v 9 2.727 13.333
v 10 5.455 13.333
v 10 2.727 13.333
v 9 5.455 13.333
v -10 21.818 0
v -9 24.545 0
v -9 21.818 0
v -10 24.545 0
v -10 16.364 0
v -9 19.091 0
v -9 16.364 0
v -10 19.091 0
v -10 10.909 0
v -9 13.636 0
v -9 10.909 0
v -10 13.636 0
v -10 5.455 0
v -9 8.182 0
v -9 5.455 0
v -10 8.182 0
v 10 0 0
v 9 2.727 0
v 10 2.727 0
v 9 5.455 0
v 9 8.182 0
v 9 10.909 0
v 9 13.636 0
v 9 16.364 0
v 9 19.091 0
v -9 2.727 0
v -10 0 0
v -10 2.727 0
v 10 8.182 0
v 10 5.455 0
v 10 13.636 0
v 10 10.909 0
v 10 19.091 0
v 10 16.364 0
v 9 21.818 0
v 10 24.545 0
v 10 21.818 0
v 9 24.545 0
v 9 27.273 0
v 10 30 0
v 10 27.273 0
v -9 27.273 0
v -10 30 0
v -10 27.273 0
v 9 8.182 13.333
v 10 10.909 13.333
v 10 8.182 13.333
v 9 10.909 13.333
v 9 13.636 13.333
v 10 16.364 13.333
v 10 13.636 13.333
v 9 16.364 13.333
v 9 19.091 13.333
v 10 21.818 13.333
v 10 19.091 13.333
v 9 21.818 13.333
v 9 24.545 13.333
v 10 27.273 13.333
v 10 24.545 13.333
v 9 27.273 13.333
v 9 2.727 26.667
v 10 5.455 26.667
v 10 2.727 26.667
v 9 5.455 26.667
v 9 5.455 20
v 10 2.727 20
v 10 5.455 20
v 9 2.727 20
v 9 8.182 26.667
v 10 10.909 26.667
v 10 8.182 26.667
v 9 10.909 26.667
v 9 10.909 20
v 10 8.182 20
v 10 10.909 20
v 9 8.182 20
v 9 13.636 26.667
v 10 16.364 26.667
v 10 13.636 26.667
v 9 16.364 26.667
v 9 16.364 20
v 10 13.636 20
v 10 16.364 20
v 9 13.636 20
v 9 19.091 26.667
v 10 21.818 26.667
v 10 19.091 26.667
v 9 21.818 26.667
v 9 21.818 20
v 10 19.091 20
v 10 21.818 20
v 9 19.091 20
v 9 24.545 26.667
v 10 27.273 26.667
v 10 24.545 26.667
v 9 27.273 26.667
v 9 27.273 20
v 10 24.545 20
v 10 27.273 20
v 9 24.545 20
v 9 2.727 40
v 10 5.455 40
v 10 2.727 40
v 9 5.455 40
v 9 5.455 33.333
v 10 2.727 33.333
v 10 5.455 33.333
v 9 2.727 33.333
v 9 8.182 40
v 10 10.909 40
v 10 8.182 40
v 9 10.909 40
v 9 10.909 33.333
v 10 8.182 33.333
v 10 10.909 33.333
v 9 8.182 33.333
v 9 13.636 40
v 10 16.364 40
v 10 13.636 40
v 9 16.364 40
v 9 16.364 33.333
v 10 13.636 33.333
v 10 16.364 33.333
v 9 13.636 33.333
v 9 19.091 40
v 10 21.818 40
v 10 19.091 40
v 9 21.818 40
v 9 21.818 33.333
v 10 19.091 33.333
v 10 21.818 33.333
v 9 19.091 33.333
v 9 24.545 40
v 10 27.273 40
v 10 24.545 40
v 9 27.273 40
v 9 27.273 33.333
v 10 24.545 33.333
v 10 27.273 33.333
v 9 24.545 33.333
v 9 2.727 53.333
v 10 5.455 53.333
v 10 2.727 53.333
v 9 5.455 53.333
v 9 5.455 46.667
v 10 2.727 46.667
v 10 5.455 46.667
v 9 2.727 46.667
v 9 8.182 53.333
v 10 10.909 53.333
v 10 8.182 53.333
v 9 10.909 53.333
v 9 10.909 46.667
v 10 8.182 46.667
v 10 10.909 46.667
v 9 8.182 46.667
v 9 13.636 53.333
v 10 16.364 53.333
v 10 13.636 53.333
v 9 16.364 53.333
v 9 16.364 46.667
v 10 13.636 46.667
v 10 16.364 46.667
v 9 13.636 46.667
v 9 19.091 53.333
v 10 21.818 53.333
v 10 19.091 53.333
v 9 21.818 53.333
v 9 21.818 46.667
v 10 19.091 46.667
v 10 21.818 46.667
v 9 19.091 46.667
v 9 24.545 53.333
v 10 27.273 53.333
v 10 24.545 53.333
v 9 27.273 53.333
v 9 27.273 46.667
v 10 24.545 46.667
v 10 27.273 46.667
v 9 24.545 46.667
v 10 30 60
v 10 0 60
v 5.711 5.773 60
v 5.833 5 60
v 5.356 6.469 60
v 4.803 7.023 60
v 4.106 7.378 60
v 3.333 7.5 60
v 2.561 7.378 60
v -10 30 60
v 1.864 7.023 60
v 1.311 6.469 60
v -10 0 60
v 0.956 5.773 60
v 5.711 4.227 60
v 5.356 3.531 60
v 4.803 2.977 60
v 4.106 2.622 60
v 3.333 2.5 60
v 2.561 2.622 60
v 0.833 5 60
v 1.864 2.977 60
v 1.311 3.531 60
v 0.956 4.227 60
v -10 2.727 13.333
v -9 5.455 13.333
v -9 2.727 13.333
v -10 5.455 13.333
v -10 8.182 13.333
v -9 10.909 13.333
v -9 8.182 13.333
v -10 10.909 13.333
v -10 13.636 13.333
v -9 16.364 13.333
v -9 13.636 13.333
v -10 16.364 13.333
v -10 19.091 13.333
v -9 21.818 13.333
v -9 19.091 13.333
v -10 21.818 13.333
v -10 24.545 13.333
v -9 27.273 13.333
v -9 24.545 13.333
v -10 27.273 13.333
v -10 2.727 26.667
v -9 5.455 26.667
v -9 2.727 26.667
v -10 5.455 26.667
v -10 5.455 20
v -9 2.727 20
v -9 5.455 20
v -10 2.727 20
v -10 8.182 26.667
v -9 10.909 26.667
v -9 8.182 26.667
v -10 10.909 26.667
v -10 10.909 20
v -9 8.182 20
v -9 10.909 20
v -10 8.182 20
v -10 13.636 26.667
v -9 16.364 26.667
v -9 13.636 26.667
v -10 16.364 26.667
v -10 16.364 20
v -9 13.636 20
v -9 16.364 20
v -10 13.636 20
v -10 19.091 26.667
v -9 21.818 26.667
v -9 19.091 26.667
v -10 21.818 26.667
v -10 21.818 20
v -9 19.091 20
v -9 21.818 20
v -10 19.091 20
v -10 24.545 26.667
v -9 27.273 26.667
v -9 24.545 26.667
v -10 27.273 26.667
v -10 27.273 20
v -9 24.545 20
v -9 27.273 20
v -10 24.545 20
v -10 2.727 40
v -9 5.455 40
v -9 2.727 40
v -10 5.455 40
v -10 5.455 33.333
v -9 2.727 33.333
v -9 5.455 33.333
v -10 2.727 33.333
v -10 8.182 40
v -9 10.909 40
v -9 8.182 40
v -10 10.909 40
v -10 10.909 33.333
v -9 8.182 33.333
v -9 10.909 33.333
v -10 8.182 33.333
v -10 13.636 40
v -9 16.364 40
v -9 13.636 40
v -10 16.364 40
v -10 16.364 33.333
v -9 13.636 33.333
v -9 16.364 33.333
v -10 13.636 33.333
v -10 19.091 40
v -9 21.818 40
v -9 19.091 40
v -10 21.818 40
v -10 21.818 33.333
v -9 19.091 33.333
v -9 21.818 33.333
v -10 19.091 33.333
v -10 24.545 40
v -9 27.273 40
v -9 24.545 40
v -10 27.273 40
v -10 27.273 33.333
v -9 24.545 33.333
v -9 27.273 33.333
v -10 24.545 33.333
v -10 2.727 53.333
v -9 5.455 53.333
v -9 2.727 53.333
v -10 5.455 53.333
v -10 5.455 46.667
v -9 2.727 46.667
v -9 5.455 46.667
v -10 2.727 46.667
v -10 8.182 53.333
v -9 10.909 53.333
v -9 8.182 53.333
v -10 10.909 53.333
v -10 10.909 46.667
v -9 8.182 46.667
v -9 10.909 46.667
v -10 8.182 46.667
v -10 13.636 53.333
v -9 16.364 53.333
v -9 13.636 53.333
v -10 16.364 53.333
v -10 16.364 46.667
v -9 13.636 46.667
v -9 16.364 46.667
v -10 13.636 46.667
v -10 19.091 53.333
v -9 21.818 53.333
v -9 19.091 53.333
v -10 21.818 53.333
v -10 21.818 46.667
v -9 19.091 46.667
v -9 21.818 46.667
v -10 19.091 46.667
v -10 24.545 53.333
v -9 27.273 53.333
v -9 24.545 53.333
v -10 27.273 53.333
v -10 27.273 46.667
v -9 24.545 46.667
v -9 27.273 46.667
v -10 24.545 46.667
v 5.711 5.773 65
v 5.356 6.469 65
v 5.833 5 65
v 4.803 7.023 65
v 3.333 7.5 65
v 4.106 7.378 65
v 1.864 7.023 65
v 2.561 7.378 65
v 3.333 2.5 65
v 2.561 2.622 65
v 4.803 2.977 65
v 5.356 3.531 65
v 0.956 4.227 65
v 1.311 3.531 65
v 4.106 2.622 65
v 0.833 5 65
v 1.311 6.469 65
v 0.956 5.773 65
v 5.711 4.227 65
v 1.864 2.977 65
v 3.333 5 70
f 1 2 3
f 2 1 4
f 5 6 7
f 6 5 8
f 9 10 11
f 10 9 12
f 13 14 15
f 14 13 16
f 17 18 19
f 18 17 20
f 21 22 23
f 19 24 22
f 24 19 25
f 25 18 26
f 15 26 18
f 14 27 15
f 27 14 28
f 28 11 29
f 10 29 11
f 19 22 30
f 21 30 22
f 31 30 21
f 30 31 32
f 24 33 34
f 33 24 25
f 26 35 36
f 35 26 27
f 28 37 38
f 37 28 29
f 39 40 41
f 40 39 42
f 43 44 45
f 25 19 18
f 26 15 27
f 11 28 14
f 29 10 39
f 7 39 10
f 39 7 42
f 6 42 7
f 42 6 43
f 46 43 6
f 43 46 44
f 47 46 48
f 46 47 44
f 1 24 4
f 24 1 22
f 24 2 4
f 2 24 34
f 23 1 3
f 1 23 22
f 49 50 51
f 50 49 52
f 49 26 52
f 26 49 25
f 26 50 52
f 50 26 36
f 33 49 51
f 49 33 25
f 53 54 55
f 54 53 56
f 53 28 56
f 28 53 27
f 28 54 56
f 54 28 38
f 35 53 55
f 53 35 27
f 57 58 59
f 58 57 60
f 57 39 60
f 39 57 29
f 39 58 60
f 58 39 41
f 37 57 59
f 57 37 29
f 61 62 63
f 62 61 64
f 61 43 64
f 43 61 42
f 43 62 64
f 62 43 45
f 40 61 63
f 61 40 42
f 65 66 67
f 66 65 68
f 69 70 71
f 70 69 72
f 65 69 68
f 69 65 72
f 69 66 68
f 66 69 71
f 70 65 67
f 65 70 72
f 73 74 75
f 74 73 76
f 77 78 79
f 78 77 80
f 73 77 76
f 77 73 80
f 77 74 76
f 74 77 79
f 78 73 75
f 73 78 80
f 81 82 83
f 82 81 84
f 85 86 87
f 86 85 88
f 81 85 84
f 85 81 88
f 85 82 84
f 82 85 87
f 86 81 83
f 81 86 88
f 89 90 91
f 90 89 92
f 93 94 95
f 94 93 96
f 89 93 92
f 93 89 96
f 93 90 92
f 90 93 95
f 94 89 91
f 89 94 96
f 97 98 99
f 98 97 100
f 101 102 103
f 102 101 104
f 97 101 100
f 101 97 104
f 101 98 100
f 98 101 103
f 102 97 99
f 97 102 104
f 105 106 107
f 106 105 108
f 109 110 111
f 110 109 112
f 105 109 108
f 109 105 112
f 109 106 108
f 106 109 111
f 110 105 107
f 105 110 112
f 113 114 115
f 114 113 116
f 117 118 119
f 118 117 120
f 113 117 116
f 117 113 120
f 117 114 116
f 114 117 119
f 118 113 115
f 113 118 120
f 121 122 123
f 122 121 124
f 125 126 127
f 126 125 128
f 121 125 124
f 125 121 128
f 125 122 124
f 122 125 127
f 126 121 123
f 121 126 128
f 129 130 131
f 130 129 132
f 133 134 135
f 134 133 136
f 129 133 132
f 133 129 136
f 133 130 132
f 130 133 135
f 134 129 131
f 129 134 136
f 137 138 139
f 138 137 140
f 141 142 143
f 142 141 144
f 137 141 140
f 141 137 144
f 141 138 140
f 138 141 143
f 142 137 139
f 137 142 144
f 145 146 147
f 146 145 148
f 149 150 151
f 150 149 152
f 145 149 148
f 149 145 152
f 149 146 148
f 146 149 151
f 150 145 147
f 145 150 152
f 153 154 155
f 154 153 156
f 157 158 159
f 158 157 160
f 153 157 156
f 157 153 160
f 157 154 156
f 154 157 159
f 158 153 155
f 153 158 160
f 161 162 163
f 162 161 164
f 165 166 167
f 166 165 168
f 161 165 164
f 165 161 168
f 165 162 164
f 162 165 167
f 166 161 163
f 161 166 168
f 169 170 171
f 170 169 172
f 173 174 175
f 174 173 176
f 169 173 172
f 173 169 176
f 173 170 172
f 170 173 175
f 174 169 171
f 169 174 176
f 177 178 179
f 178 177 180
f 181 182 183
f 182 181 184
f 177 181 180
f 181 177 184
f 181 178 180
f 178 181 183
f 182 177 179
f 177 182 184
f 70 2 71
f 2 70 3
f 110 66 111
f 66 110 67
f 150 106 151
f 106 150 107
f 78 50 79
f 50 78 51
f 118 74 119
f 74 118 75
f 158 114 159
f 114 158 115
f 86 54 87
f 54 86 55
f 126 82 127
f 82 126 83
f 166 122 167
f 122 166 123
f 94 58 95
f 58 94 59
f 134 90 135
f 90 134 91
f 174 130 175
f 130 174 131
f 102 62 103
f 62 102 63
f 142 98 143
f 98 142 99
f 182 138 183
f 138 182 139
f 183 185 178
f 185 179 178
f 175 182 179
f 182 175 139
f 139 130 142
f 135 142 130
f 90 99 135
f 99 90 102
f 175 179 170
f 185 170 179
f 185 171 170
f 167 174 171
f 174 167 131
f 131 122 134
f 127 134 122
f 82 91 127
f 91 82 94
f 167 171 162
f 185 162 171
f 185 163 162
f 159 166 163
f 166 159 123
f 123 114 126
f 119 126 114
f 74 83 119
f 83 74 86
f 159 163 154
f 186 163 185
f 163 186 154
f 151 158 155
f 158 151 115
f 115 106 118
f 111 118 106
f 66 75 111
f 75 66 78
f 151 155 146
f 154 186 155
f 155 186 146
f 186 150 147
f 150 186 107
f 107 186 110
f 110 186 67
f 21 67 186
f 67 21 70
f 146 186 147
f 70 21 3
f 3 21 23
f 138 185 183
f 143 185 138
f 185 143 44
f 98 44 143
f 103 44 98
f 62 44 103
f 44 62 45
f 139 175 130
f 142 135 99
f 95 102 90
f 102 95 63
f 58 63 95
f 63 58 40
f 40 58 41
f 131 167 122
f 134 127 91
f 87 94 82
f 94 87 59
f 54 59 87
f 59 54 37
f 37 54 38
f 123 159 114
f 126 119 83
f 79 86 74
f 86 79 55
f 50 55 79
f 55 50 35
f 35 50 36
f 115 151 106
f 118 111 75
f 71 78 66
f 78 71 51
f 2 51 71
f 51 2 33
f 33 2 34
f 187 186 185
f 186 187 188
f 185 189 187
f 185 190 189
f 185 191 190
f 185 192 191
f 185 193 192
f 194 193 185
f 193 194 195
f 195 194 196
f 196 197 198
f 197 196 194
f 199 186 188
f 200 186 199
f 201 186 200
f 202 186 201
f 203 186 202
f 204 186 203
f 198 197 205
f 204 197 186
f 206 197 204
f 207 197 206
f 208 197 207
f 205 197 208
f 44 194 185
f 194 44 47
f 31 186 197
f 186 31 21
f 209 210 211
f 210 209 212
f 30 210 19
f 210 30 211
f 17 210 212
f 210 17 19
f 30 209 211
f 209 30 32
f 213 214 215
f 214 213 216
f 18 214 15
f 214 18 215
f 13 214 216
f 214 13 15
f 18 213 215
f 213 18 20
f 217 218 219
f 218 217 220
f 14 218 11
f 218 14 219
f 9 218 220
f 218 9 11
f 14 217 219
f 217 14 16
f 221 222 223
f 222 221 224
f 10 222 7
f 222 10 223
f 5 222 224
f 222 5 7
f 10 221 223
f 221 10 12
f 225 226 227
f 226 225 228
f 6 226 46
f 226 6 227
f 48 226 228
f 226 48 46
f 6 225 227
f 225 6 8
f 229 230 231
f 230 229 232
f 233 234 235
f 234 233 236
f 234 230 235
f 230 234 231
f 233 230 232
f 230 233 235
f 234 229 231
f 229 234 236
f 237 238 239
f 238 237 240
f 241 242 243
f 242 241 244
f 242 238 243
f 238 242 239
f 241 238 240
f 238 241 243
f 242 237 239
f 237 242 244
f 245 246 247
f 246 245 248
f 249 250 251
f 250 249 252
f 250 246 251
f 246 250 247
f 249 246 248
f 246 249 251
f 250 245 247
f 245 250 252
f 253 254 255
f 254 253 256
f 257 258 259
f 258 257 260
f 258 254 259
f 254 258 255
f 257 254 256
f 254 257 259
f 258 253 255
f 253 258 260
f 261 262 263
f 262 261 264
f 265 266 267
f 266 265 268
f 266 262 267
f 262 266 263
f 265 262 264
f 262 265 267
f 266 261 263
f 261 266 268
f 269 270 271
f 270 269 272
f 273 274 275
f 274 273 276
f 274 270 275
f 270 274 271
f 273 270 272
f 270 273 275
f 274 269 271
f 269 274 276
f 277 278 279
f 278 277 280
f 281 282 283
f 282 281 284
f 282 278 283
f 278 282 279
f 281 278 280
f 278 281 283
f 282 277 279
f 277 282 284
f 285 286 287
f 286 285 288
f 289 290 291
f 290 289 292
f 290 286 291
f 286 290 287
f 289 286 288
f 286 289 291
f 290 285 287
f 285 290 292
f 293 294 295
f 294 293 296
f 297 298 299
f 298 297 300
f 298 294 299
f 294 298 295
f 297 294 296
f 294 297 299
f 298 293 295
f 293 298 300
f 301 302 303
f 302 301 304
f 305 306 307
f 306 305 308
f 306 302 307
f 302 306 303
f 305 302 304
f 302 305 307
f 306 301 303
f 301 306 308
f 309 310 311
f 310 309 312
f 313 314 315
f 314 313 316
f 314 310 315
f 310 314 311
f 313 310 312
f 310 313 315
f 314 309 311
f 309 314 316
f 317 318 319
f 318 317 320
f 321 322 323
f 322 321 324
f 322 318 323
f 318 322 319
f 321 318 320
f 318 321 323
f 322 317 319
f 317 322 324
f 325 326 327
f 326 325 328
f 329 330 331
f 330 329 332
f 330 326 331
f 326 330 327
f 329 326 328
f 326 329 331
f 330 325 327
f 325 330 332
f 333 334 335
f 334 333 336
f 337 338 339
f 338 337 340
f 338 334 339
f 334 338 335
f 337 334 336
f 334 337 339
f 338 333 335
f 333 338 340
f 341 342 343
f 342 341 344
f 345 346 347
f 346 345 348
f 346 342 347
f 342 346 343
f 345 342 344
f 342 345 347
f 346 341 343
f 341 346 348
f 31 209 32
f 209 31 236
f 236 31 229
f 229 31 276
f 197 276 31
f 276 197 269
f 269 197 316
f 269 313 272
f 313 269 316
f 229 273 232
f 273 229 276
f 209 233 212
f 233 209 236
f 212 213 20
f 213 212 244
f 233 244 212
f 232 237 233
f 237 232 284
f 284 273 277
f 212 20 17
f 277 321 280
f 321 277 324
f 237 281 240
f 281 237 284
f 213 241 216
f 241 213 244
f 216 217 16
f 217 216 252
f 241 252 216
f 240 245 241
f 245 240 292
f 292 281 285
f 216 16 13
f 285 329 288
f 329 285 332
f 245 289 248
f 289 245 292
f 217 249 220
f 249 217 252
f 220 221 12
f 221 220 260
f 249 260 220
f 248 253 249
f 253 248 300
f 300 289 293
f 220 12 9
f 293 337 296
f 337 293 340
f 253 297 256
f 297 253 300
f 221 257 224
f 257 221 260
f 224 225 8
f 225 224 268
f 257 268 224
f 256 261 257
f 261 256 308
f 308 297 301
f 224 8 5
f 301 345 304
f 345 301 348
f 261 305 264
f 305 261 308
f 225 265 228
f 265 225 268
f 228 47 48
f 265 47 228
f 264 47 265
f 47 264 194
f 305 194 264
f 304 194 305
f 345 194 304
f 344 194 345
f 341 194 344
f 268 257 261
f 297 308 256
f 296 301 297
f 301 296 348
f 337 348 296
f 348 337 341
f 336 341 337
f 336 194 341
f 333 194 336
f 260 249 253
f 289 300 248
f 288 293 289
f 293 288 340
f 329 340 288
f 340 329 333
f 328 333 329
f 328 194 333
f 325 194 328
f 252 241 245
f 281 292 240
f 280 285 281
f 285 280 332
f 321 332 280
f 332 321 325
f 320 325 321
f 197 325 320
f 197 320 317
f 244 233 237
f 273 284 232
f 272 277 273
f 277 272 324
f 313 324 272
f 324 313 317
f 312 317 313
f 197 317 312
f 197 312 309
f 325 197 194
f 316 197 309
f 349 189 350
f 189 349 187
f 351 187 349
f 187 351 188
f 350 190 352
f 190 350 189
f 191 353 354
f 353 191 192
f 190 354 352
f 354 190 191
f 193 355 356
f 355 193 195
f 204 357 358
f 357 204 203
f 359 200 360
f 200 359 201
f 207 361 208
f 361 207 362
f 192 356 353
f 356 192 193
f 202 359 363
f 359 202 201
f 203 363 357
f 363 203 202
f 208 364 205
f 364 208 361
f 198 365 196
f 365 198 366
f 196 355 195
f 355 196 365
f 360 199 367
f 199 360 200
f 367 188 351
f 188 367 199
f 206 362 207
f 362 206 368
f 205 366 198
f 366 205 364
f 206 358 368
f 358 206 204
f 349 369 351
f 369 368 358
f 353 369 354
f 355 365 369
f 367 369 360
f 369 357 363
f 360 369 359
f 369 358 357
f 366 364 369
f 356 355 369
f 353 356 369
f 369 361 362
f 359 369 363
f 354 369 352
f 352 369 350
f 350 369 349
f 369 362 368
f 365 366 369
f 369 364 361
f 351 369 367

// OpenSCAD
skyscraper(20, 30, 60, 5, 4, 1);

module skyscraper(b_width, b_length, b_height, window_cols, window_rows, watertower) {
  windows(b_width/2, b_length, b_height, window_cols, window_rows);
  mirror([1,0,0]) windows(b_width/2, b_length, b_height, window_cols,  window_rows);
    
  if (watertower) {
    translate([b_width/6, 5, b_height]) watertower(b_width/4);
  }
} // skyscraper

module windows(b_width, b_length, b_height, window_cols, window_rows) {
    
  w_length = b_length/(2*window_cols+1);
  w_height = b_height/(2*window_rows+1);

  difference() {
    cube([b_width, b_length, b_height]); 
        
    for (z = [0:1:window_rows-1]) {
      for (x = [0:1:window_cols-1]) {
        if (z == 0) {
          translate([b_width-1, (2*x+1)*w_length, 0]) cube([2,  w_length , w_height*2]);
        }
        else {
          translate([b_width-1, (2*x+1)*w_length, (2*z+1)*w_height]) cube([2,  w_length , w_height]);
        }
      }
    } // windows
  } // difference
} // facade

module watertower(width) {
  $fn = 20;
  cylinder(h=5, r1=width/2, r2=width/2);
  translate([0, 0, 5]) cylinder(h=5, r1=width/2, r2=0);
}
